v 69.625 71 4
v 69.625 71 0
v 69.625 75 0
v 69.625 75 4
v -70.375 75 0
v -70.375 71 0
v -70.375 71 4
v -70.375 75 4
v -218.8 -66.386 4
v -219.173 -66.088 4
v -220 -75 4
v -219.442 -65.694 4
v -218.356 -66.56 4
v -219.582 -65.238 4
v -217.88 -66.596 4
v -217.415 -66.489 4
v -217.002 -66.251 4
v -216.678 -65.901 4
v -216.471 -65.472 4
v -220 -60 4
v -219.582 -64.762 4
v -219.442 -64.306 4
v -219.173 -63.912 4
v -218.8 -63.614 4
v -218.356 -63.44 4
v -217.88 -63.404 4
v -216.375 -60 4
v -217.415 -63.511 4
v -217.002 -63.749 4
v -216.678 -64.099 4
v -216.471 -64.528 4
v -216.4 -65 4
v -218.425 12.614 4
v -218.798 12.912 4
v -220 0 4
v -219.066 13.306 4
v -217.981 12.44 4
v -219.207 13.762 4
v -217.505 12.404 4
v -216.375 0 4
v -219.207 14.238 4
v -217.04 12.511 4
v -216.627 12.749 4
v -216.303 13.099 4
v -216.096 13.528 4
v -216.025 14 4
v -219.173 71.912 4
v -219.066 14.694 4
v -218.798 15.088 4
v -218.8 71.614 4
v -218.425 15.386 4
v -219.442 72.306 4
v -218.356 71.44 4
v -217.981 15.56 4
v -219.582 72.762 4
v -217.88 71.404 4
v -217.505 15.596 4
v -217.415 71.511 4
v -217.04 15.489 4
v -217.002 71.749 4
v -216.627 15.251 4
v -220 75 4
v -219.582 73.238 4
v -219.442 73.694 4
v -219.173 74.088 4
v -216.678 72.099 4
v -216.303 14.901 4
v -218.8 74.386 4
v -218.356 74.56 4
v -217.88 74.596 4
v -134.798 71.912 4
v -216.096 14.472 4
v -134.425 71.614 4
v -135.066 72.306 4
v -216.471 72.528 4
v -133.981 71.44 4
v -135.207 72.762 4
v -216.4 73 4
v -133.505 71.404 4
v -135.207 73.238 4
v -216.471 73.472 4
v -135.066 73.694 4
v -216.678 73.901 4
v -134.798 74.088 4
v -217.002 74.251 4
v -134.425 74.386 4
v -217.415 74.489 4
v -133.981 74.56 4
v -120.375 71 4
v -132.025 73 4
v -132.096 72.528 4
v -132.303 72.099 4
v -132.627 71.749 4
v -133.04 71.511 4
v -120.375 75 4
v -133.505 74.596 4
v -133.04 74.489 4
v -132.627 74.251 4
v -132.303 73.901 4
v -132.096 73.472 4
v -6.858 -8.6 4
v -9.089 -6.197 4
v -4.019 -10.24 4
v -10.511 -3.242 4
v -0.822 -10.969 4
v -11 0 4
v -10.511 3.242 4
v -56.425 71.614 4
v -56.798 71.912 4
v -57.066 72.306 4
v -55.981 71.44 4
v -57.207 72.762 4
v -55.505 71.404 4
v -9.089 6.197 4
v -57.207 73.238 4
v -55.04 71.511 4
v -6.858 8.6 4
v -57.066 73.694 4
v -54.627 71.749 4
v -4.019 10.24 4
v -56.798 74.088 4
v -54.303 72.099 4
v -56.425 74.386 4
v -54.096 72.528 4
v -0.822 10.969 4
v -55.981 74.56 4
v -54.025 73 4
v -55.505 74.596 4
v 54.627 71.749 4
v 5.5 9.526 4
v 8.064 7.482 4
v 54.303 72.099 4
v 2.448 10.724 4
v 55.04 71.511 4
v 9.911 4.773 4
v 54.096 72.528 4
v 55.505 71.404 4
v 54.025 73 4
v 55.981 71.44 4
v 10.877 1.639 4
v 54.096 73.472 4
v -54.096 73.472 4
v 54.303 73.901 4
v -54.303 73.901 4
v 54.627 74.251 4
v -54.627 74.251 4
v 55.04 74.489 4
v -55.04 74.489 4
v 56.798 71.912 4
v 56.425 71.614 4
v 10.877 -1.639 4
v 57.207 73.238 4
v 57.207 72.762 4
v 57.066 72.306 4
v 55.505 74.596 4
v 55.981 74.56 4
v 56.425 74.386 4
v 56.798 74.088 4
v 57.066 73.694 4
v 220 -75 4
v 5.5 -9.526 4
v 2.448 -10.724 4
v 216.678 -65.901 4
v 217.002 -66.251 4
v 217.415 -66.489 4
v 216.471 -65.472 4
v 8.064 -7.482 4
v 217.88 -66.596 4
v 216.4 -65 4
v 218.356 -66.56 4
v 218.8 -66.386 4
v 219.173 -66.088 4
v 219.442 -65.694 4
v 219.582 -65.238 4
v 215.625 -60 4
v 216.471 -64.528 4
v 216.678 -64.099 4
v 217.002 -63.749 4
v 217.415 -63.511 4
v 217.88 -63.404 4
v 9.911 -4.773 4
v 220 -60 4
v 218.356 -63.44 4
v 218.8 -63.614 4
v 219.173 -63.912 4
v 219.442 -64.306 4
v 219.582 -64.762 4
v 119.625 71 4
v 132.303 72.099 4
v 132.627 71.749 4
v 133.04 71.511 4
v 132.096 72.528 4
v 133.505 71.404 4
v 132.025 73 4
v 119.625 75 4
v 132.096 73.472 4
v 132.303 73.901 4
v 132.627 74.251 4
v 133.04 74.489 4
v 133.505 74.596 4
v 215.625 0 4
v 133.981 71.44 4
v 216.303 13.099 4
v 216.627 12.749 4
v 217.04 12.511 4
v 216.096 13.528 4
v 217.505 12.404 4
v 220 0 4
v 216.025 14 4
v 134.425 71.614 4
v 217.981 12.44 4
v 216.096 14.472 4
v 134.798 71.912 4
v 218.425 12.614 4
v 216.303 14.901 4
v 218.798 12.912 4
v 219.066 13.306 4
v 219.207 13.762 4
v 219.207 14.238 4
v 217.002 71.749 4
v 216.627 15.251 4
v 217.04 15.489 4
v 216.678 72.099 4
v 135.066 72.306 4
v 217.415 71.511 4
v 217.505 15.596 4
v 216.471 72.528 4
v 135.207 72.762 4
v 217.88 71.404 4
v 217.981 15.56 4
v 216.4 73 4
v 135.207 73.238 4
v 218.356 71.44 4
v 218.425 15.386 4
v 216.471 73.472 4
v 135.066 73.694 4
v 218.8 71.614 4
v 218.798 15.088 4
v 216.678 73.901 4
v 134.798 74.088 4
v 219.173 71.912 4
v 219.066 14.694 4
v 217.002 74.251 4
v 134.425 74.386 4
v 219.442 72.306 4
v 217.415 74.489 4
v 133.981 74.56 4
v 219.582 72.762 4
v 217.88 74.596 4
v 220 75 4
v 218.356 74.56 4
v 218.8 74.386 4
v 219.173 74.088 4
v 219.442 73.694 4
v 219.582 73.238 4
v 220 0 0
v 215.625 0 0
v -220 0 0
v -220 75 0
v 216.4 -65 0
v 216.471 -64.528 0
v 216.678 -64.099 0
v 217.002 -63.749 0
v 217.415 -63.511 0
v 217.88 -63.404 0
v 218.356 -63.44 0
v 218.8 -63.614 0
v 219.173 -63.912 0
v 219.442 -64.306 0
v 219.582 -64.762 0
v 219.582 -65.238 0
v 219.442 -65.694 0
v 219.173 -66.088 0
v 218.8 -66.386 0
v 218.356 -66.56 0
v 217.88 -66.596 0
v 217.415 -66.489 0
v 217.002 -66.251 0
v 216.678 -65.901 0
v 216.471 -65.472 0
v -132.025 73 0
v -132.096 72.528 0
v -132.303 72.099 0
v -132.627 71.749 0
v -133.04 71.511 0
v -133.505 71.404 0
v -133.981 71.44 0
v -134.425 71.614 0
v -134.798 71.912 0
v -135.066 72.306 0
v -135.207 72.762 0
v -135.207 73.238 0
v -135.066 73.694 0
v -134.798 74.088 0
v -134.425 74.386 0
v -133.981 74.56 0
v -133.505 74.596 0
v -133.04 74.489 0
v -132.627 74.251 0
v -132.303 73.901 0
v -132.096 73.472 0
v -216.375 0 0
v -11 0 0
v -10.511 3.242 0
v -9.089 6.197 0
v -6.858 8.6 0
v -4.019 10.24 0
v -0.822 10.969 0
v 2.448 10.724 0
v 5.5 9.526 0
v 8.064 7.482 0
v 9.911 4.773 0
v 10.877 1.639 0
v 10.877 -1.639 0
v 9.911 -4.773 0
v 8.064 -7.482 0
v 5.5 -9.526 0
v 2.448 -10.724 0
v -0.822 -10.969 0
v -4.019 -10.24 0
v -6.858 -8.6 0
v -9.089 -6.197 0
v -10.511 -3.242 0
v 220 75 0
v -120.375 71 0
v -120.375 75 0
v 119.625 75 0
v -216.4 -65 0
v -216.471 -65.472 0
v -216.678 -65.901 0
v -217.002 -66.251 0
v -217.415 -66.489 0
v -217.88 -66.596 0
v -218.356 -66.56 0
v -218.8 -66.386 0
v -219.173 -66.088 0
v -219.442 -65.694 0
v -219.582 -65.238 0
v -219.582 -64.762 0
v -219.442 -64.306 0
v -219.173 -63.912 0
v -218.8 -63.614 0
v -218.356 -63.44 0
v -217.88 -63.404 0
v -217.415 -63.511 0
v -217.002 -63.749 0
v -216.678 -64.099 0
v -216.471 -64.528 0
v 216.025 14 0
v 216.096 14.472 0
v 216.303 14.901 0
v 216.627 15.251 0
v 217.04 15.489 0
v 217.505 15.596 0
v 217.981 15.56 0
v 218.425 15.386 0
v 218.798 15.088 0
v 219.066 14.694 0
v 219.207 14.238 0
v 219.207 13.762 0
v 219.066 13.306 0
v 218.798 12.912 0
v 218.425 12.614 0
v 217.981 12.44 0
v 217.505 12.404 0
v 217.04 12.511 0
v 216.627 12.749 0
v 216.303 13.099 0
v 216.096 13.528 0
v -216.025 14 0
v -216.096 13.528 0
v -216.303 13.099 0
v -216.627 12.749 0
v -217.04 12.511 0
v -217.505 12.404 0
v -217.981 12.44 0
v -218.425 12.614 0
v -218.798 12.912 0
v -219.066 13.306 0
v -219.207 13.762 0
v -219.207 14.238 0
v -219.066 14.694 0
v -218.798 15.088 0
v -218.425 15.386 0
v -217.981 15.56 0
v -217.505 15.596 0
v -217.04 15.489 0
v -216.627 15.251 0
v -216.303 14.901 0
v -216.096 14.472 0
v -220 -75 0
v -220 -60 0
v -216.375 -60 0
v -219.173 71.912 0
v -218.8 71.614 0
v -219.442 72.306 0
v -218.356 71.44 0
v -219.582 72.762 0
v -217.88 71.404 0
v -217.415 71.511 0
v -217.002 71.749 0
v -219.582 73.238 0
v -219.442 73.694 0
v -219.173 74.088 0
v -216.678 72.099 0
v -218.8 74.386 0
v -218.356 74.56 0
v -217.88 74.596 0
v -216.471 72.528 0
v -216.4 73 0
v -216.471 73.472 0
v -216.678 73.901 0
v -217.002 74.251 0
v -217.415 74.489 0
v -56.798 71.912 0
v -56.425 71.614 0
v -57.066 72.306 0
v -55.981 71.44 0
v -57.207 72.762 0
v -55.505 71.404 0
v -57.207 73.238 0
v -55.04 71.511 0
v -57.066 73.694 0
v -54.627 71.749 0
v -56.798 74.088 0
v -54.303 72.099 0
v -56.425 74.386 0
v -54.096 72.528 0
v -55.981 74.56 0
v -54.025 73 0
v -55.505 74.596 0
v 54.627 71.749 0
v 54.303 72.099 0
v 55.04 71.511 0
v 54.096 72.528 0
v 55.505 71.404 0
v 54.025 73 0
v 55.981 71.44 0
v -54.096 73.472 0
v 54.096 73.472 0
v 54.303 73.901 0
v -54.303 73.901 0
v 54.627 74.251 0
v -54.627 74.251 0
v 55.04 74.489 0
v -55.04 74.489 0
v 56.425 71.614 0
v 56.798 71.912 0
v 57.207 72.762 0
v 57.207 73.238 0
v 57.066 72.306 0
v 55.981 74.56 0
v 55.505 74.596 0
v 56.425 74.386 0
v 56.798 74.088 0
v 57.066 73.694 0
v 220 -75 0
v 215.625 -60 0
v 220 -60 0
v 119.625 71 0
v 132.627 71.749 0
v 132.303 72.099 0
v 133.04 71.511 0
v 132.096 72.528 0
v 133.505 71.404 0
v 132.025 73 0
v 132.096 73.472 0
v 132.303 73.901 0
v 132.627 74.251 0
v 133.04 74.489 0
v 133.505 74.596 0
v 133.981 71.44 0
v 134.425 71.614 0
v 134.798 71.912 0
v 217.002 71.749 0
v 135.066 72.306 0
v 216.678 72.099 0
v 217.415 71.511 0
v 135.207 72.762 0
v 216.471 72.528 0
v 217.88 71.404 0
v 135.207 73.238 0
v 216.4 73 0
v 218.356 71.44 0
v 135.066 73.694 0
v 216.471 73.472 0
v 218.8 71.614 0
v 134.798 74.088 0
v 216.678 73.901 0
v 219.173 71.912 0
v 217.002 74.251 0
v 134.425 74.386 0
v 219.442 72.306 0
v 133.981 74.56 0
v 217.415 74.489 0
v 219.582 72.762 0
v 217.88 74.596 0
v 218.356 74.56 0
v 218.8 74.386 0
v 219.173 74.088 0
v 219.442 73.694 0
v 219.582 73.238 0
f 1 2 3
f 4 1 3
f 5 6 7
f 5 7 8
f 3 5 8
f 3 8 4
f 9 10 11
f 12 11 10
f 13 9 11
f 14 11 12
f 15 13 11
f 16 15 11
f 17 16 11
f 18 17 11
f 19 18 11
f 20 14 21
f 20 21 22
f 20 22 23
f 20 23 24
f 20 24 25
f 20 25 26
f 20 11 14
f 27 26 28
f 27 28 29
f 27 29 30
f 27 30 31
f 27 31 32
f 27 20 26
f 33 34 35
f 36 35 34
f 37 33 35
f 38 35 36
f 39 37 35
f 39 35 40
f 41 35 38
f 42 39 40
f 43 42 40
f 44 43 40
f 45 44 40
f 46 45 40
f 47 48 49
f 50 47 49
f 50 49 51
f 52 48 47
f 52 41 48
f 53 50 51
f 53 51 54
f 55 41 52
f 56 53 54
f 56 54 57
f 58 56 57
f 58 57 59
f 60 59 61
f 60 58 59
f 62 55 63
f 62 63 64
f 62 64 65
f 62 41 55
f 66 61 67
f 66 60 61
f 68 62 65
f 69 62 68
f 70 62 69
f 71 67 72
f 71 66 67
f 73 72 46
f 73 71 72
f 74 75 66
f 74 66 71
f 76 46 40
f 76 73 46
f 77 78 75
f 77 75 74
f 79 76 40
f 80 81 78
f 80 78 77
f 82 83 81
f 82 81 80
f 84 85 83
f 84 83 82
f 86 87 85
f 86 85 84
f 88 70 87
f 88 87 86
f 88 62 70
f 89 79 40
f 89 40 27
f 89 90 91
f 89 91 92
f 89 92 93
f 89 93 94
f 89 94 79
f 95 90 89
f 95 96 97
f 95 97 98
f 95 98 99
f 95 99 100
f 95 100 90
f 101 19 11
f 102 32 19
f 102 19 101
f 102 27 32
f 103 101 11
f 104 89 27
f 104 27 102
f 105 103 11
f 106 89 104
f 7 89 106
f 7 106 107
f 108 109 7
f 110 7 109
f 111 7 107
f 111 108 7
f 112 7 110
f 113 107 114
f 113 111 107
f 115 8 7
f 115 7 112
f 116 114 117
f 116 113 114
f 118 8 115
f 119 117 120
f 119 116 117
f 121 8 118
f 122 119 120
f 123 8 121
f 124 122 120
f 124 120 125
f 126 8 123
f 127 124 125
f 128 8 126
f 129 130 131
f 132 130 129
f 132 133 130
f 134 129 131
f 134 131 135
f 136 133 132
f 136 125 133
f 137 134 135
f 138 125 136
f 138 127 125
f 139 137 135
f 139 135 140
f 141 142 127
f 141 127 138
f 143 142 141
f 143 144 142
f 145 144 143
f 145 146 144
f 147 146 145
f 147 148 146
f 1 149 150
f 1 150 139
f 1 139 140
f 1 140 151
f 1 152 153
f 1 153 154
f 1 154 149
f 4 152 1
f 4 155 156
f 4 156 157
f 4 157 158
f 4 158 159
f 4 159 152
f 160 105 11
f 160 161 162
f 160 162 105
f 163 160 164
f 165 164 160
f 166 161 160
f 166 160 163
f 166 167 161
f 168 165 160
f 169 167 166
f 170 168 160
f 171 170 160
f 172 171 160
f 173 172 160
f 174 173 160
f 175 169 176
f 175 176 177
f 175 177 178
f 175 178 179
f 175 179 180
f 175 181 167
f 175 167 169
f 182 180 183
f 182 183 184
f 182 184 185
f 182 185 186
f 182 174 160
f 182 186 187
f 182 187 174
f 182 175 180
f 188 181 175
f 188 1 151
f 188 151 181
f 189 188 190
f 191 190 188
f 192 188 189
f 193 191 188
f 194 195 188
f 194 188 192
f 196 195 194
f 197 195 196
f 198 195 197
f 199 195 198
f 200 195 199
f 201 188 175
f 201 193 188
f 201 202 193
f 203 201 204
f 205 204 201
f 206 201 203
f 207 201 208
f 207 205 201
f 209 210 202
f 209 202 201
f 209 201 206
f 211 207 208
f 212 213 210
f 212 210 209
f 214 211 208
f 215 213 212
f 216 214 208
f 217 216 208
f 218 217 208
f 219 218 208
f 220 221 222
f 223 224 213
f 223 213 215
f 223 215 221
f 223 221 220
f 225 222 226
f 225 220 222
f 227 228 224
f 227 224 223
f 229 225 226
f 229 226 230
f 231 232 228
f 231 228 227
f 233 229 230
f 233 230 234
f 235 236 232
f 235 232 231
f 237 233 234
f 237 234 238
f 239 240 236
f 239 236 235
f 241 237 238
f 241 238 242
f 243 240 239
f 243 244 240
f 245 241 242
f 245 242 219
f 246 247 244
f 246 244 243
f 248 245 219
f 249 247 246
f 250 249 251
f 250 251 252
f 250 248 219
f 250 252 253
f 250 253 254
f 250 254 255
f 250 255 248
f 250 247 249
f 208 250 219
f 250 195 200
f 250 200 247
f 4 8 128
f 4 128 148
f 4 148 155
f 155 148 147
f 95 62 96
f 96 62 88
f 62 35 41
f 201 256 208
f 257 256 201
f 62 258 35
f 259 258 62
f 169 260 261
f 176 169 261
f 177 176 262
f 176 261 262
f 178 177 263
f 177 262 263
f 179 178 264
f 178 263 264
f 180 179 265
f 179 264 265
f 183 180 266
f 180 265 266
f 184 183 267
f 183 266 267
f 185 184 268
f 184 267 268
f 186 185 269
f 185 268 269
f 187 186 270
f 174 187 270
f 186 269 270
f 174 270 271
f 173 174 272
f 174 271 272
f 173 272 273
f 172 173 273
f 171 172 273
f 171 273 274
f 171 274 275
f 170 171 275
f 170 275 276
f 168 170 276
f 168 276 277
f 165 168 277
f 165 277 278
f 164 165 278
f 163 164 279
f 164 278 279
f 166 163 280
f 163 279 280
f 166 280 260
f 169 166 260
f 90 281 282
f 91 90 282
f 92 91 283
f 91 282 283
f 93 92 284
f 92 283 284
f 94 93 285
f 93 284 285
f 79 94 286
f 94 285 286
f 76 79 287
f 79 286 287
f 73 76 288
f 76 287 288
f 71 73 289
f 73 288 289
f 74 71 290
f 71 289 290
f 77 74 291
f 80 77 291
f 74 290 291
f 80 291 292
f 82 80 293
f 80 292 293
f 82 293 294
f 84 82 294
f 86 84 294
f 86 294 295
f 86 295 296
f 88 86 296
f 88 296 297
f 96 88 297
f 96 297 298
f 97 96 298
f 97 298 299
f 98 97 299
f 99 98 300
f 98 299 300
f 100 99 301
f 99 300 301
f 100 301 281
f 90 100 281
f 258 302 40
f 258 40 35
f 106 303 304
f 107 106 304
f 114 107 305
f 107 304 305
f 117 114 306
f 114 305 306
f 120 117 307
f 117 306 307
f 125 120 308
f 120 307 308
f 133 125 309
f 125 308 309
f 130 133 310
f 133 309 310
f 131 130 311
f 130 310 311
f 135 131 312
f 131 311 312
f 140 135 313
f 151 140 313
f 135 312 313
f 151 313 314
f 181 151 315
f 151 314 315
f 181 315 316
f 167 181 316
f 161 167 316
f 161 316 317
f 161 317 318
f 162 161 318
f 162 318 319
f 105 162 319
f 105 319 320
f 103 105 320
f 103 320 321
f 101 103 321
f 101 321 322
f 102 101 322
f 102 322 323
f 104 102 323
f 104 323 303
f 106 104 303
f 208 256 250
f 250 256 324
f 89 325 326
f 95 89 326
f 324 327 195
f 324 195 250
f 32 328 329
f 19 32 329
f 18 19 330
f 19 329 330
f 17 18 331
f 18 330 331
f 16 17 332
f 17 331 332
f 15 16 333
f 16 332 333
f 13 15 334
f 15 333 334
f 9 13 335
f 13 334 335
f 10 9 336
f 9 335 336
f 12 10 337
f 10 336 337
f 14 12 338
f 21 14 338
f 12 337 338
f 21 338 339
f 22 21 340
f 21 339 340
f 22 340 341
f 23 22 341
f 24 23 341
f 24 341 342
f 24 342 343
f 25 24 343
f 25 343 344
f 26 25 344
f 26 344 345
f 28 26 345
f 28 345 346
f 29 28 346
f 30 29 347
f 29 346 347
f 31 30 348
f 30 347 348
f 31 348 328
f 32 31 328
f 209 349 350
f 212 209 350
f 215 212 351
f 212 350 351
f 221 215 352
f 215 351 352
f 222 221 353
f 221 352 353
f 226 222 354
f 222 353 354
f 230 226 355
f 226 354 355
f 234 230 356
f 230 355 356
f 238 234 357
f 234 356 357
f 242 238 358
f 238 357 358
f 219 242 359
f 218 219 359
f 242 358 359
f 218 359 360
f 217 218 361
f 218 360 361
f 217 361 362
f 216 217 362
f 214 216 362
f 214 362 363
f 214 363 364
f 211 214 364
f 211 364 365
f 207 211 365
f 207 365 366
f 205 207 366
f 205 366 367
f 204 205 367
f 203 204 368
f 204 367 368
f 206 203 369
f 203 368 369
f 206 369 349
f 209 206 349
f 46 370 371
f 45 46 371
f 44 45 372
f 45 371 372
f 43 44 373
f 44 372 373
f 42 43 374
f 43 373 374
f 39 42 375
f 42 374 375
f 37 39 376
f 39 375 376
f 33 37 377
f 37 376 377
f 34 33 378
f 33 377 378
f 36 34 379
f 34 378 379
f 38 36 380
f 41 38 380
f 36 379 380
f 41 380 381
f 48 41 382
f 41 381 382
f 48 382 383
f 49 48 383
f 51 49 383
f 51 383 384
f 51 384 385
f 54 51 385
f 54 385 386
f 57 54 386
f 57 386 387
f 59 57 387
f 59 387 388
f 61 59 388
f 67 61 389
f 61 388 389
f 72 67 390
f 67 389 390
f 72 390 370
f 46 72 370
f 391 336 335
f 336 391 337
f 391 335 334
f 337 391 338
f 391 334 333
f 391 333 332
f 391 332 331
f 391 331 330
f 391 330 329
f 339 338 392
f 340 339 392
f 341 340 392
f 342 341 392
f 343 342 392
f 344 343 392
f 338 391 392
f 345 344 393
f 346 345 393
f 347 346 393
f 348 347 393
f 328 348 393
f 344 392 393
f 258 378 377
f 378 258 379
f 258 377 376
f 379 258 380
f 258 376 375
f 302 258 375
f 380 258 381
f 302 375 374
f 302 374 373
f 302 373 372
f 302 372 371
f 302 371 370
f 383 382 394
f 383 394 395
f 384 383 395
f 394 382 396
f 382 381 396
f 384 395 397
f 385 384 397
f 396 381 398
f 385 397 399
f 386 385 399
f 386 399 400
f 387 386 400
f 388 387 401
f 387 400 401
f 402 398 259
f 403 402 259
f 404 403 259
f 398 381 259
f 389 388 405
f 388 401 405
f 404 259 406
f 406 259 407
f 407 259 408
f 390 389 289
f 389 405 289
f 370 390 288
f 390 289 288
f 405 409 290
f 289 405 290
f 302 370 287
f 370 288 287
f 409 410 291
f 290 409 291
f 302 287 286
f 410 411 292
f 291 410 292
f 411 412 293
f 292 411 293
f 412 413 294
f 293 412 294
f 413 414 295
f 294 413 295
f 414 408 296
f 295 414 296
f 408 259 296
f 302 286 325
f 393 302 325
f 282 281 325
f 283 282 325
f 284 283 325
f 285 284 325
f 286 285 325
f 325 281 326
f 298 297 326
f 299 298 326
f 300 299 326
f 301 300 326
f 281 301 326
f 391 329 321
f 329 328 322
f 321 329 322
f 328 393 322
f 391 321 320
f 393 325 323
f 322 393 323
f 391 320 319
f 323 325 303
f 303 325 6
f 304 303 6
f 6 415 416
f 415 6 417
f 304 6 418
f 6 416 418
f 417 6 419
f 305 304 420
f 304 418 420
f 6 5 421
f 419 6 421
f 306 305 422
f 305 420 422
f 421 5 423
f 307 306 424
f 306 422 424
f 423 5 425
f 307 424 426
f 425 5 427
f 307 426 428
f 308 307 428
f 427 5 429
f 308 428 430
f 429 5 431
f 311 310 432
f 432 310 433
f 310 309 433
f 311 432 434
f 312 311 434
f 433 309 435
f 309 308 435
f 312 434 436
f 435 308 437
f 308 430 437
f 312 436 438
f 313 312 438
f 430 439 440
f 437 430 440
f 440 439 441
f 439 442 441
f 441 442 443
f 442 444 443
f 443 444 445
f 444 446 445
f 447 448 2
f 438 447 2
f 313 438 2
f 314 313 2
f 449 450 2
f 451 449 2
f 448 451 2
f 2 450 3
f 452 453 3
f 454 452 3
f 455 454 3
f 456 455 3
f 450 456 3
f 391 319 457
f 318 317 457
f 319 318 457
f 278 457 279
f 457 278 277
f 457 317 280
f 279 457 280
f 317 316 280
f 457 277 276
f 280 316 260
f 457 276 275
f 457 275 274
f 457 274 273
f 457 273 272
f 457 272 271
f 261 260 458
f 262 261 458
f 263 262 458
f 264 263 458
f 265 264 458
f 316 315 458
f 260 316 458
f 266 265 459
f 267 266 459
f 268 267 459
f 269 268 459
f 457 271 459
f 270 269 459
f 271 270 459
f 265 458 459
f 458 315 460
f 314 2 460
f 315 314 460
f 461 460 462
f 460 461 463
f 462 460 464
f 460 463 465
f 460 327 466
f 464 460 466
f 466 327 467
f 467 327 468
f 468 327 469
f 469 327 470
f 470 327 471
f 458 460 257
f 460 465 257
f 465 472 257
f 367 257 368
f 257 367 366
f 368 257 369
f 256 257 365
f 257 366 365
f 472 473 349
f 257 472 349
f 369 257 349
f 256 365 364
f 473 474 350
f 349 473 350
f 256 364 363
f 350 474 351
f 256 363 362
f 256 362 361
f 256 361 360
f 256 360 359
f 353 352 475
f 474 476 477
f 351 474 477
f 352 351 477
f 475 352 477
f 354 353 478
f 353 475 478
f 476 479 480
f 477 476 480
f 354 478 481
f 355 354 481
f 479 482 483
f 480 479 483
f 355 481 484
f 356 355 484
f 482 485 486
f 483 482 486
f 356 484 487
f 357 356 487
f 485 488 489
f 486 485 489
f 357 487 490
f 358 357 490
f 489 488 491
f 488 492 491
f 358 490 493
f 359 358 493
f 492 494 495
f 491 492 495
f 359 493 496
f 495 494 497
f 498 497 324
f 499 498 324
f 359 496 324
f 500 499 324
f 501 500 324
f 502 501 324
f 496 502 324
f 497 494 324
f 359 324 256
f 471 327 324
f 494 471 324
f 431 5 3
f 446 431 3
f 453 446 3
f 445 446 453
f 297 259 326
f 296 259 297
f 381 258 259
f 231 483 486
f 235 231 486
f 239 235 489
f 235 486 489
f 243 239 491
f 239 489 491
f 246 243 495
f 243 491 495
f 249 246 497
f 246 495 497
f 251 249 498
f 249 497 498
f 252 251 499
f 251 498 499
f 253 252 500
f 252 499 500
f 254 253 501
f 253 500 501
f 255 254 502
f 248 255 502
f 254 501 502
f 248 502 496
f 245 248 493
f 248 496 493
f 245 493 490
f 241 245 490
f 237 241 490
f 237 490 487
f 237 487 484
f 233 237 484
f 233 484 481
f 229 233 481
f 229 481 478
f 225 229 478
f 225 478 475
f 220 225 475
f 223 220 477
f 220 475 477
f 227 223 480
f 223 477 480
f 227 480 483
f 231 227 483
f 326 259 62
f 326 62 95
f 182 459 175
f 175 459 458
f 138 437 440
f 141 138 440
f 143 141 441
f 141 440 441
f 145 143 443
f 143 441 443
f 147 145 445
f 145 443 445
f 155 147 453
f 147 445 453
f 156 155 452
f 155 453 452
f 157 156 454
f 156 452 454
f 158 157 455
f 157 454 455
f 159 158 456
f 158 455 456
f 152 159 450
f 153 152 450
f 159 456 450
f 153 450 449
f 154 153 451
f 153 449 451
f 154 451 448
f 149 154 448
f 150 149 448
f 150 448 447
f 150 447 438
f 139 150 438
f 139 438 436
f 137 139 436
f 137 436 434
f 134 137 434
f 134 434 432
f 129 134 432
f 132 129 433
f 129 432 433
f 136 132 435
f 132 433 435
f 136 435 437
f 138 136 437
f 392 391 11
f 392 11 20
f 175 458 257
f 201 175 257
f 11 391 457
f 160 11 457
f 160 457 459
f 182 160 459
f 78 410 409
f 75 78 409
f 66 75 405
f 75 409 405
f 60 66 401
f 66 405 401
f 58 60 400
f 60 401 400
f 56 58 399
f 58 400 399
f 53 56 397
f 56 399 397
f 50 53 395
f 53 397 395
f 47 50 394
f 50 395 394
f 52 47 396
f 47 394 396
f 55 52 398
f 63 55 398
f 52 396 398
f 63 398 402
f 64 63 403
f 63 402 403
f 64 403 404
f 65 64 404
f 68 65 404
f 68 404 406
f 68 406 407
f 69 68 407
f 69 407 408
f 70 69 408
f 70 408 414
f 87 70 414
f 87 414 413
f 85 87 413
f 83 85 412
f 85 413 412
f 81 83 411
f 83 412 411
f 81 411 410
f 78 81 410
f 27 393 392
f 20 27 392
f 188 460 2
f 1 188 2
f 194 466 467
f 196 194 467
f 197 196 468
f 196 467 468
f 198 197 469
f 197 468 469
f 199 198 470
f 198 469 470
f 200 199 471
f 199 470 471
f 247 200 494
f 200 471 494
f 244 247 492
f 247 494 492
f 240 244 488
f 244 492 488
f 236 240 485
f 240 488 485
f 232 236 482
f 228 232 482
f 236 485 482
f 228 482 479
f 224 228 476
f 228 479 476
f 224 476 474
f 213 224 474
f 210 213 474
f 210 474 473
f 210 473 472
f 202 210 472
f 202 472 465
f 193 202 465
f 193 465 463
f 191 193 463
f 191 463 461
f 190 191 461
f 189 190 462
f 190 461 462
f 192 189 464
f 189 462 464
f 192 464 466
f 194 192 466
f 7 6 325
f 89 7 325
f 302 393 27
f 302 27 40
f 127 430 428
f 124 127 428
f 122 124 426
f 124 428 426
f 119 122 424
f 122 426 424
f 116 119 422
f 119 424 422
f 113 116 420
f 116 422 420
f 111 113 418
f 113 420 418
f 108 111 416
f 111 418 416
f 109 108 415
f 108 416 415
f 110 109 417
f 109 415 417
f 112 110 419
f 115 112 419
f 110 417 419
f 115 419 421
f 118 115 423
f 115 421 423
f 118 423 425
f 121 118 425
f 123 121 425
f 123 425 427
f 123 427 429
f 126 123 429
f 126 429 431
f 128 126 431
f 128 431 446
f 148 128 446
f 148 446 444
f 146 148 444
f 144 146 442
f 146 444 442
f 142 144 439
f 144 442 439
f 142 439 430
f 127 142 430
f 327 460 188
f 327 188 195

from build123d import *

# Parameters (mm, degrees)
ESQUISSE1_W             = 440
ESQUISSE1_H             = 150
BOSS_EXTRU_1_DEPTH      = 4
ESQUISSE2_R             = 11
ENL_V_MAT_EXTRU_1_DEPTH = 10
ESQUISSE3_W             = 3.624864112
ESQUISSE3_H             = 60
ESQUISSE3_W_2           = 4.375135888
ESQUISSE3_W_3           = 50
ESQUISSE3_H_2           = 4
ENL_V_MAT_EXTRU_2_DEPTH = 4
ESQUISSE4_R             = 1.6
ENL_V_MAT_EXTRU_3_DEPTH = 4


with BuildPart() as part:
    # Esquisse1 → Boss.-Extru.1 (new body)
    with BuildSketch(Plane.XY):
        Rectangle(ESQUISSE1_W, ESQUISSE1_H)
    extrude(amount=BOSS_EXTRU_1_DEPTH)

    # Esquisse2 → Enlèv. mat.-Extru.1 (cut)
    with BuildSketch(Plane(origin=(0, 0, 0), x_dir=(-1, 0, 0), z_dir=(0, 0, -1))):
        Circle(ESQUISSE2_R)
    extrude(amount=-ENL_V_MAT_EXTRU_1_DEPTH, mode=Mode.SUBTRACT)

    # Esquisse3 → Enlèv. mat.-Extru.2 (cut)
    with BuildSketch(Plane(origin=(0, 0, 0), x_dir=(-1, 0, 0), z_dir=(0, 0, -1))):
        with Locations((218.187567944, -30)):
            Rectangle(ESQUISSE3_W, ESQUISSE3_H)
        with Locations((-217.812432056, -30)):
            Rectangle(ESQUISSE3_W_2, ESQUISSE3_H)
        with Locations((95.375135888, 73)):
            Rectangle(ESQUISSE3_W_3, ESQUISSE3_H_2)
        with Locations((-94.624864112, 73)):
            Rectangle(ESQUISSE3_W_3, ESQUISSE3_H_2)
    extrude(amount=-ENL_V_MAT_EXTRU_2_DEPTH, mode=Mode.SUBTRACT)

    # Esquisse4 → Enlèv. mat.-Extru.3 (cut)
    with BuildSketch(Plane(origin=(0, 0, 0), x_dir=(-1, 0, 0), z_dir=(0, 0, -1))):
        with Locations((-217.624864112, 14)):
            Circle(ESQUISSE4_R)
        with Locations((-218, 73)):
            Circle(ESQUISSE4_R)
        with Locations((-218, -65)):
            Circle(ESQUISSE4_R)
        with Locations((-133.624864112, 73)):
            Circle(ESQUISSE4_R)
        with Locations((-55.624864112, 73)):
            Circle(ESQUISSE4_R)
        with Locations(Location((55.624864112, 73, 0), (0, 0, 180))):
            Circle(ESQUISSE4_R)
        with Locations(Location((133.624864112, 73, 0), (0, 0, 180))):
            Circle(ESQUISSE4_R)
        with Locations(Location((218, -65, 0), (0, 0, 180))):
            Circle(ESQUISSE4_R)
        with Locations(Location((218, 73, 0), (0, 0, 180))):
            Circle(ESQUISSE4_R)
        with Locations(Location((217.624864112, 14, 0), (0, 0, 180))):
            Circle(ESQUISSE4_R)
    extrude(amount=-ENL_V_MAT_EXTRU_3_DEPTH, mode=Mode.SUBTRACT)


solid = part.part
